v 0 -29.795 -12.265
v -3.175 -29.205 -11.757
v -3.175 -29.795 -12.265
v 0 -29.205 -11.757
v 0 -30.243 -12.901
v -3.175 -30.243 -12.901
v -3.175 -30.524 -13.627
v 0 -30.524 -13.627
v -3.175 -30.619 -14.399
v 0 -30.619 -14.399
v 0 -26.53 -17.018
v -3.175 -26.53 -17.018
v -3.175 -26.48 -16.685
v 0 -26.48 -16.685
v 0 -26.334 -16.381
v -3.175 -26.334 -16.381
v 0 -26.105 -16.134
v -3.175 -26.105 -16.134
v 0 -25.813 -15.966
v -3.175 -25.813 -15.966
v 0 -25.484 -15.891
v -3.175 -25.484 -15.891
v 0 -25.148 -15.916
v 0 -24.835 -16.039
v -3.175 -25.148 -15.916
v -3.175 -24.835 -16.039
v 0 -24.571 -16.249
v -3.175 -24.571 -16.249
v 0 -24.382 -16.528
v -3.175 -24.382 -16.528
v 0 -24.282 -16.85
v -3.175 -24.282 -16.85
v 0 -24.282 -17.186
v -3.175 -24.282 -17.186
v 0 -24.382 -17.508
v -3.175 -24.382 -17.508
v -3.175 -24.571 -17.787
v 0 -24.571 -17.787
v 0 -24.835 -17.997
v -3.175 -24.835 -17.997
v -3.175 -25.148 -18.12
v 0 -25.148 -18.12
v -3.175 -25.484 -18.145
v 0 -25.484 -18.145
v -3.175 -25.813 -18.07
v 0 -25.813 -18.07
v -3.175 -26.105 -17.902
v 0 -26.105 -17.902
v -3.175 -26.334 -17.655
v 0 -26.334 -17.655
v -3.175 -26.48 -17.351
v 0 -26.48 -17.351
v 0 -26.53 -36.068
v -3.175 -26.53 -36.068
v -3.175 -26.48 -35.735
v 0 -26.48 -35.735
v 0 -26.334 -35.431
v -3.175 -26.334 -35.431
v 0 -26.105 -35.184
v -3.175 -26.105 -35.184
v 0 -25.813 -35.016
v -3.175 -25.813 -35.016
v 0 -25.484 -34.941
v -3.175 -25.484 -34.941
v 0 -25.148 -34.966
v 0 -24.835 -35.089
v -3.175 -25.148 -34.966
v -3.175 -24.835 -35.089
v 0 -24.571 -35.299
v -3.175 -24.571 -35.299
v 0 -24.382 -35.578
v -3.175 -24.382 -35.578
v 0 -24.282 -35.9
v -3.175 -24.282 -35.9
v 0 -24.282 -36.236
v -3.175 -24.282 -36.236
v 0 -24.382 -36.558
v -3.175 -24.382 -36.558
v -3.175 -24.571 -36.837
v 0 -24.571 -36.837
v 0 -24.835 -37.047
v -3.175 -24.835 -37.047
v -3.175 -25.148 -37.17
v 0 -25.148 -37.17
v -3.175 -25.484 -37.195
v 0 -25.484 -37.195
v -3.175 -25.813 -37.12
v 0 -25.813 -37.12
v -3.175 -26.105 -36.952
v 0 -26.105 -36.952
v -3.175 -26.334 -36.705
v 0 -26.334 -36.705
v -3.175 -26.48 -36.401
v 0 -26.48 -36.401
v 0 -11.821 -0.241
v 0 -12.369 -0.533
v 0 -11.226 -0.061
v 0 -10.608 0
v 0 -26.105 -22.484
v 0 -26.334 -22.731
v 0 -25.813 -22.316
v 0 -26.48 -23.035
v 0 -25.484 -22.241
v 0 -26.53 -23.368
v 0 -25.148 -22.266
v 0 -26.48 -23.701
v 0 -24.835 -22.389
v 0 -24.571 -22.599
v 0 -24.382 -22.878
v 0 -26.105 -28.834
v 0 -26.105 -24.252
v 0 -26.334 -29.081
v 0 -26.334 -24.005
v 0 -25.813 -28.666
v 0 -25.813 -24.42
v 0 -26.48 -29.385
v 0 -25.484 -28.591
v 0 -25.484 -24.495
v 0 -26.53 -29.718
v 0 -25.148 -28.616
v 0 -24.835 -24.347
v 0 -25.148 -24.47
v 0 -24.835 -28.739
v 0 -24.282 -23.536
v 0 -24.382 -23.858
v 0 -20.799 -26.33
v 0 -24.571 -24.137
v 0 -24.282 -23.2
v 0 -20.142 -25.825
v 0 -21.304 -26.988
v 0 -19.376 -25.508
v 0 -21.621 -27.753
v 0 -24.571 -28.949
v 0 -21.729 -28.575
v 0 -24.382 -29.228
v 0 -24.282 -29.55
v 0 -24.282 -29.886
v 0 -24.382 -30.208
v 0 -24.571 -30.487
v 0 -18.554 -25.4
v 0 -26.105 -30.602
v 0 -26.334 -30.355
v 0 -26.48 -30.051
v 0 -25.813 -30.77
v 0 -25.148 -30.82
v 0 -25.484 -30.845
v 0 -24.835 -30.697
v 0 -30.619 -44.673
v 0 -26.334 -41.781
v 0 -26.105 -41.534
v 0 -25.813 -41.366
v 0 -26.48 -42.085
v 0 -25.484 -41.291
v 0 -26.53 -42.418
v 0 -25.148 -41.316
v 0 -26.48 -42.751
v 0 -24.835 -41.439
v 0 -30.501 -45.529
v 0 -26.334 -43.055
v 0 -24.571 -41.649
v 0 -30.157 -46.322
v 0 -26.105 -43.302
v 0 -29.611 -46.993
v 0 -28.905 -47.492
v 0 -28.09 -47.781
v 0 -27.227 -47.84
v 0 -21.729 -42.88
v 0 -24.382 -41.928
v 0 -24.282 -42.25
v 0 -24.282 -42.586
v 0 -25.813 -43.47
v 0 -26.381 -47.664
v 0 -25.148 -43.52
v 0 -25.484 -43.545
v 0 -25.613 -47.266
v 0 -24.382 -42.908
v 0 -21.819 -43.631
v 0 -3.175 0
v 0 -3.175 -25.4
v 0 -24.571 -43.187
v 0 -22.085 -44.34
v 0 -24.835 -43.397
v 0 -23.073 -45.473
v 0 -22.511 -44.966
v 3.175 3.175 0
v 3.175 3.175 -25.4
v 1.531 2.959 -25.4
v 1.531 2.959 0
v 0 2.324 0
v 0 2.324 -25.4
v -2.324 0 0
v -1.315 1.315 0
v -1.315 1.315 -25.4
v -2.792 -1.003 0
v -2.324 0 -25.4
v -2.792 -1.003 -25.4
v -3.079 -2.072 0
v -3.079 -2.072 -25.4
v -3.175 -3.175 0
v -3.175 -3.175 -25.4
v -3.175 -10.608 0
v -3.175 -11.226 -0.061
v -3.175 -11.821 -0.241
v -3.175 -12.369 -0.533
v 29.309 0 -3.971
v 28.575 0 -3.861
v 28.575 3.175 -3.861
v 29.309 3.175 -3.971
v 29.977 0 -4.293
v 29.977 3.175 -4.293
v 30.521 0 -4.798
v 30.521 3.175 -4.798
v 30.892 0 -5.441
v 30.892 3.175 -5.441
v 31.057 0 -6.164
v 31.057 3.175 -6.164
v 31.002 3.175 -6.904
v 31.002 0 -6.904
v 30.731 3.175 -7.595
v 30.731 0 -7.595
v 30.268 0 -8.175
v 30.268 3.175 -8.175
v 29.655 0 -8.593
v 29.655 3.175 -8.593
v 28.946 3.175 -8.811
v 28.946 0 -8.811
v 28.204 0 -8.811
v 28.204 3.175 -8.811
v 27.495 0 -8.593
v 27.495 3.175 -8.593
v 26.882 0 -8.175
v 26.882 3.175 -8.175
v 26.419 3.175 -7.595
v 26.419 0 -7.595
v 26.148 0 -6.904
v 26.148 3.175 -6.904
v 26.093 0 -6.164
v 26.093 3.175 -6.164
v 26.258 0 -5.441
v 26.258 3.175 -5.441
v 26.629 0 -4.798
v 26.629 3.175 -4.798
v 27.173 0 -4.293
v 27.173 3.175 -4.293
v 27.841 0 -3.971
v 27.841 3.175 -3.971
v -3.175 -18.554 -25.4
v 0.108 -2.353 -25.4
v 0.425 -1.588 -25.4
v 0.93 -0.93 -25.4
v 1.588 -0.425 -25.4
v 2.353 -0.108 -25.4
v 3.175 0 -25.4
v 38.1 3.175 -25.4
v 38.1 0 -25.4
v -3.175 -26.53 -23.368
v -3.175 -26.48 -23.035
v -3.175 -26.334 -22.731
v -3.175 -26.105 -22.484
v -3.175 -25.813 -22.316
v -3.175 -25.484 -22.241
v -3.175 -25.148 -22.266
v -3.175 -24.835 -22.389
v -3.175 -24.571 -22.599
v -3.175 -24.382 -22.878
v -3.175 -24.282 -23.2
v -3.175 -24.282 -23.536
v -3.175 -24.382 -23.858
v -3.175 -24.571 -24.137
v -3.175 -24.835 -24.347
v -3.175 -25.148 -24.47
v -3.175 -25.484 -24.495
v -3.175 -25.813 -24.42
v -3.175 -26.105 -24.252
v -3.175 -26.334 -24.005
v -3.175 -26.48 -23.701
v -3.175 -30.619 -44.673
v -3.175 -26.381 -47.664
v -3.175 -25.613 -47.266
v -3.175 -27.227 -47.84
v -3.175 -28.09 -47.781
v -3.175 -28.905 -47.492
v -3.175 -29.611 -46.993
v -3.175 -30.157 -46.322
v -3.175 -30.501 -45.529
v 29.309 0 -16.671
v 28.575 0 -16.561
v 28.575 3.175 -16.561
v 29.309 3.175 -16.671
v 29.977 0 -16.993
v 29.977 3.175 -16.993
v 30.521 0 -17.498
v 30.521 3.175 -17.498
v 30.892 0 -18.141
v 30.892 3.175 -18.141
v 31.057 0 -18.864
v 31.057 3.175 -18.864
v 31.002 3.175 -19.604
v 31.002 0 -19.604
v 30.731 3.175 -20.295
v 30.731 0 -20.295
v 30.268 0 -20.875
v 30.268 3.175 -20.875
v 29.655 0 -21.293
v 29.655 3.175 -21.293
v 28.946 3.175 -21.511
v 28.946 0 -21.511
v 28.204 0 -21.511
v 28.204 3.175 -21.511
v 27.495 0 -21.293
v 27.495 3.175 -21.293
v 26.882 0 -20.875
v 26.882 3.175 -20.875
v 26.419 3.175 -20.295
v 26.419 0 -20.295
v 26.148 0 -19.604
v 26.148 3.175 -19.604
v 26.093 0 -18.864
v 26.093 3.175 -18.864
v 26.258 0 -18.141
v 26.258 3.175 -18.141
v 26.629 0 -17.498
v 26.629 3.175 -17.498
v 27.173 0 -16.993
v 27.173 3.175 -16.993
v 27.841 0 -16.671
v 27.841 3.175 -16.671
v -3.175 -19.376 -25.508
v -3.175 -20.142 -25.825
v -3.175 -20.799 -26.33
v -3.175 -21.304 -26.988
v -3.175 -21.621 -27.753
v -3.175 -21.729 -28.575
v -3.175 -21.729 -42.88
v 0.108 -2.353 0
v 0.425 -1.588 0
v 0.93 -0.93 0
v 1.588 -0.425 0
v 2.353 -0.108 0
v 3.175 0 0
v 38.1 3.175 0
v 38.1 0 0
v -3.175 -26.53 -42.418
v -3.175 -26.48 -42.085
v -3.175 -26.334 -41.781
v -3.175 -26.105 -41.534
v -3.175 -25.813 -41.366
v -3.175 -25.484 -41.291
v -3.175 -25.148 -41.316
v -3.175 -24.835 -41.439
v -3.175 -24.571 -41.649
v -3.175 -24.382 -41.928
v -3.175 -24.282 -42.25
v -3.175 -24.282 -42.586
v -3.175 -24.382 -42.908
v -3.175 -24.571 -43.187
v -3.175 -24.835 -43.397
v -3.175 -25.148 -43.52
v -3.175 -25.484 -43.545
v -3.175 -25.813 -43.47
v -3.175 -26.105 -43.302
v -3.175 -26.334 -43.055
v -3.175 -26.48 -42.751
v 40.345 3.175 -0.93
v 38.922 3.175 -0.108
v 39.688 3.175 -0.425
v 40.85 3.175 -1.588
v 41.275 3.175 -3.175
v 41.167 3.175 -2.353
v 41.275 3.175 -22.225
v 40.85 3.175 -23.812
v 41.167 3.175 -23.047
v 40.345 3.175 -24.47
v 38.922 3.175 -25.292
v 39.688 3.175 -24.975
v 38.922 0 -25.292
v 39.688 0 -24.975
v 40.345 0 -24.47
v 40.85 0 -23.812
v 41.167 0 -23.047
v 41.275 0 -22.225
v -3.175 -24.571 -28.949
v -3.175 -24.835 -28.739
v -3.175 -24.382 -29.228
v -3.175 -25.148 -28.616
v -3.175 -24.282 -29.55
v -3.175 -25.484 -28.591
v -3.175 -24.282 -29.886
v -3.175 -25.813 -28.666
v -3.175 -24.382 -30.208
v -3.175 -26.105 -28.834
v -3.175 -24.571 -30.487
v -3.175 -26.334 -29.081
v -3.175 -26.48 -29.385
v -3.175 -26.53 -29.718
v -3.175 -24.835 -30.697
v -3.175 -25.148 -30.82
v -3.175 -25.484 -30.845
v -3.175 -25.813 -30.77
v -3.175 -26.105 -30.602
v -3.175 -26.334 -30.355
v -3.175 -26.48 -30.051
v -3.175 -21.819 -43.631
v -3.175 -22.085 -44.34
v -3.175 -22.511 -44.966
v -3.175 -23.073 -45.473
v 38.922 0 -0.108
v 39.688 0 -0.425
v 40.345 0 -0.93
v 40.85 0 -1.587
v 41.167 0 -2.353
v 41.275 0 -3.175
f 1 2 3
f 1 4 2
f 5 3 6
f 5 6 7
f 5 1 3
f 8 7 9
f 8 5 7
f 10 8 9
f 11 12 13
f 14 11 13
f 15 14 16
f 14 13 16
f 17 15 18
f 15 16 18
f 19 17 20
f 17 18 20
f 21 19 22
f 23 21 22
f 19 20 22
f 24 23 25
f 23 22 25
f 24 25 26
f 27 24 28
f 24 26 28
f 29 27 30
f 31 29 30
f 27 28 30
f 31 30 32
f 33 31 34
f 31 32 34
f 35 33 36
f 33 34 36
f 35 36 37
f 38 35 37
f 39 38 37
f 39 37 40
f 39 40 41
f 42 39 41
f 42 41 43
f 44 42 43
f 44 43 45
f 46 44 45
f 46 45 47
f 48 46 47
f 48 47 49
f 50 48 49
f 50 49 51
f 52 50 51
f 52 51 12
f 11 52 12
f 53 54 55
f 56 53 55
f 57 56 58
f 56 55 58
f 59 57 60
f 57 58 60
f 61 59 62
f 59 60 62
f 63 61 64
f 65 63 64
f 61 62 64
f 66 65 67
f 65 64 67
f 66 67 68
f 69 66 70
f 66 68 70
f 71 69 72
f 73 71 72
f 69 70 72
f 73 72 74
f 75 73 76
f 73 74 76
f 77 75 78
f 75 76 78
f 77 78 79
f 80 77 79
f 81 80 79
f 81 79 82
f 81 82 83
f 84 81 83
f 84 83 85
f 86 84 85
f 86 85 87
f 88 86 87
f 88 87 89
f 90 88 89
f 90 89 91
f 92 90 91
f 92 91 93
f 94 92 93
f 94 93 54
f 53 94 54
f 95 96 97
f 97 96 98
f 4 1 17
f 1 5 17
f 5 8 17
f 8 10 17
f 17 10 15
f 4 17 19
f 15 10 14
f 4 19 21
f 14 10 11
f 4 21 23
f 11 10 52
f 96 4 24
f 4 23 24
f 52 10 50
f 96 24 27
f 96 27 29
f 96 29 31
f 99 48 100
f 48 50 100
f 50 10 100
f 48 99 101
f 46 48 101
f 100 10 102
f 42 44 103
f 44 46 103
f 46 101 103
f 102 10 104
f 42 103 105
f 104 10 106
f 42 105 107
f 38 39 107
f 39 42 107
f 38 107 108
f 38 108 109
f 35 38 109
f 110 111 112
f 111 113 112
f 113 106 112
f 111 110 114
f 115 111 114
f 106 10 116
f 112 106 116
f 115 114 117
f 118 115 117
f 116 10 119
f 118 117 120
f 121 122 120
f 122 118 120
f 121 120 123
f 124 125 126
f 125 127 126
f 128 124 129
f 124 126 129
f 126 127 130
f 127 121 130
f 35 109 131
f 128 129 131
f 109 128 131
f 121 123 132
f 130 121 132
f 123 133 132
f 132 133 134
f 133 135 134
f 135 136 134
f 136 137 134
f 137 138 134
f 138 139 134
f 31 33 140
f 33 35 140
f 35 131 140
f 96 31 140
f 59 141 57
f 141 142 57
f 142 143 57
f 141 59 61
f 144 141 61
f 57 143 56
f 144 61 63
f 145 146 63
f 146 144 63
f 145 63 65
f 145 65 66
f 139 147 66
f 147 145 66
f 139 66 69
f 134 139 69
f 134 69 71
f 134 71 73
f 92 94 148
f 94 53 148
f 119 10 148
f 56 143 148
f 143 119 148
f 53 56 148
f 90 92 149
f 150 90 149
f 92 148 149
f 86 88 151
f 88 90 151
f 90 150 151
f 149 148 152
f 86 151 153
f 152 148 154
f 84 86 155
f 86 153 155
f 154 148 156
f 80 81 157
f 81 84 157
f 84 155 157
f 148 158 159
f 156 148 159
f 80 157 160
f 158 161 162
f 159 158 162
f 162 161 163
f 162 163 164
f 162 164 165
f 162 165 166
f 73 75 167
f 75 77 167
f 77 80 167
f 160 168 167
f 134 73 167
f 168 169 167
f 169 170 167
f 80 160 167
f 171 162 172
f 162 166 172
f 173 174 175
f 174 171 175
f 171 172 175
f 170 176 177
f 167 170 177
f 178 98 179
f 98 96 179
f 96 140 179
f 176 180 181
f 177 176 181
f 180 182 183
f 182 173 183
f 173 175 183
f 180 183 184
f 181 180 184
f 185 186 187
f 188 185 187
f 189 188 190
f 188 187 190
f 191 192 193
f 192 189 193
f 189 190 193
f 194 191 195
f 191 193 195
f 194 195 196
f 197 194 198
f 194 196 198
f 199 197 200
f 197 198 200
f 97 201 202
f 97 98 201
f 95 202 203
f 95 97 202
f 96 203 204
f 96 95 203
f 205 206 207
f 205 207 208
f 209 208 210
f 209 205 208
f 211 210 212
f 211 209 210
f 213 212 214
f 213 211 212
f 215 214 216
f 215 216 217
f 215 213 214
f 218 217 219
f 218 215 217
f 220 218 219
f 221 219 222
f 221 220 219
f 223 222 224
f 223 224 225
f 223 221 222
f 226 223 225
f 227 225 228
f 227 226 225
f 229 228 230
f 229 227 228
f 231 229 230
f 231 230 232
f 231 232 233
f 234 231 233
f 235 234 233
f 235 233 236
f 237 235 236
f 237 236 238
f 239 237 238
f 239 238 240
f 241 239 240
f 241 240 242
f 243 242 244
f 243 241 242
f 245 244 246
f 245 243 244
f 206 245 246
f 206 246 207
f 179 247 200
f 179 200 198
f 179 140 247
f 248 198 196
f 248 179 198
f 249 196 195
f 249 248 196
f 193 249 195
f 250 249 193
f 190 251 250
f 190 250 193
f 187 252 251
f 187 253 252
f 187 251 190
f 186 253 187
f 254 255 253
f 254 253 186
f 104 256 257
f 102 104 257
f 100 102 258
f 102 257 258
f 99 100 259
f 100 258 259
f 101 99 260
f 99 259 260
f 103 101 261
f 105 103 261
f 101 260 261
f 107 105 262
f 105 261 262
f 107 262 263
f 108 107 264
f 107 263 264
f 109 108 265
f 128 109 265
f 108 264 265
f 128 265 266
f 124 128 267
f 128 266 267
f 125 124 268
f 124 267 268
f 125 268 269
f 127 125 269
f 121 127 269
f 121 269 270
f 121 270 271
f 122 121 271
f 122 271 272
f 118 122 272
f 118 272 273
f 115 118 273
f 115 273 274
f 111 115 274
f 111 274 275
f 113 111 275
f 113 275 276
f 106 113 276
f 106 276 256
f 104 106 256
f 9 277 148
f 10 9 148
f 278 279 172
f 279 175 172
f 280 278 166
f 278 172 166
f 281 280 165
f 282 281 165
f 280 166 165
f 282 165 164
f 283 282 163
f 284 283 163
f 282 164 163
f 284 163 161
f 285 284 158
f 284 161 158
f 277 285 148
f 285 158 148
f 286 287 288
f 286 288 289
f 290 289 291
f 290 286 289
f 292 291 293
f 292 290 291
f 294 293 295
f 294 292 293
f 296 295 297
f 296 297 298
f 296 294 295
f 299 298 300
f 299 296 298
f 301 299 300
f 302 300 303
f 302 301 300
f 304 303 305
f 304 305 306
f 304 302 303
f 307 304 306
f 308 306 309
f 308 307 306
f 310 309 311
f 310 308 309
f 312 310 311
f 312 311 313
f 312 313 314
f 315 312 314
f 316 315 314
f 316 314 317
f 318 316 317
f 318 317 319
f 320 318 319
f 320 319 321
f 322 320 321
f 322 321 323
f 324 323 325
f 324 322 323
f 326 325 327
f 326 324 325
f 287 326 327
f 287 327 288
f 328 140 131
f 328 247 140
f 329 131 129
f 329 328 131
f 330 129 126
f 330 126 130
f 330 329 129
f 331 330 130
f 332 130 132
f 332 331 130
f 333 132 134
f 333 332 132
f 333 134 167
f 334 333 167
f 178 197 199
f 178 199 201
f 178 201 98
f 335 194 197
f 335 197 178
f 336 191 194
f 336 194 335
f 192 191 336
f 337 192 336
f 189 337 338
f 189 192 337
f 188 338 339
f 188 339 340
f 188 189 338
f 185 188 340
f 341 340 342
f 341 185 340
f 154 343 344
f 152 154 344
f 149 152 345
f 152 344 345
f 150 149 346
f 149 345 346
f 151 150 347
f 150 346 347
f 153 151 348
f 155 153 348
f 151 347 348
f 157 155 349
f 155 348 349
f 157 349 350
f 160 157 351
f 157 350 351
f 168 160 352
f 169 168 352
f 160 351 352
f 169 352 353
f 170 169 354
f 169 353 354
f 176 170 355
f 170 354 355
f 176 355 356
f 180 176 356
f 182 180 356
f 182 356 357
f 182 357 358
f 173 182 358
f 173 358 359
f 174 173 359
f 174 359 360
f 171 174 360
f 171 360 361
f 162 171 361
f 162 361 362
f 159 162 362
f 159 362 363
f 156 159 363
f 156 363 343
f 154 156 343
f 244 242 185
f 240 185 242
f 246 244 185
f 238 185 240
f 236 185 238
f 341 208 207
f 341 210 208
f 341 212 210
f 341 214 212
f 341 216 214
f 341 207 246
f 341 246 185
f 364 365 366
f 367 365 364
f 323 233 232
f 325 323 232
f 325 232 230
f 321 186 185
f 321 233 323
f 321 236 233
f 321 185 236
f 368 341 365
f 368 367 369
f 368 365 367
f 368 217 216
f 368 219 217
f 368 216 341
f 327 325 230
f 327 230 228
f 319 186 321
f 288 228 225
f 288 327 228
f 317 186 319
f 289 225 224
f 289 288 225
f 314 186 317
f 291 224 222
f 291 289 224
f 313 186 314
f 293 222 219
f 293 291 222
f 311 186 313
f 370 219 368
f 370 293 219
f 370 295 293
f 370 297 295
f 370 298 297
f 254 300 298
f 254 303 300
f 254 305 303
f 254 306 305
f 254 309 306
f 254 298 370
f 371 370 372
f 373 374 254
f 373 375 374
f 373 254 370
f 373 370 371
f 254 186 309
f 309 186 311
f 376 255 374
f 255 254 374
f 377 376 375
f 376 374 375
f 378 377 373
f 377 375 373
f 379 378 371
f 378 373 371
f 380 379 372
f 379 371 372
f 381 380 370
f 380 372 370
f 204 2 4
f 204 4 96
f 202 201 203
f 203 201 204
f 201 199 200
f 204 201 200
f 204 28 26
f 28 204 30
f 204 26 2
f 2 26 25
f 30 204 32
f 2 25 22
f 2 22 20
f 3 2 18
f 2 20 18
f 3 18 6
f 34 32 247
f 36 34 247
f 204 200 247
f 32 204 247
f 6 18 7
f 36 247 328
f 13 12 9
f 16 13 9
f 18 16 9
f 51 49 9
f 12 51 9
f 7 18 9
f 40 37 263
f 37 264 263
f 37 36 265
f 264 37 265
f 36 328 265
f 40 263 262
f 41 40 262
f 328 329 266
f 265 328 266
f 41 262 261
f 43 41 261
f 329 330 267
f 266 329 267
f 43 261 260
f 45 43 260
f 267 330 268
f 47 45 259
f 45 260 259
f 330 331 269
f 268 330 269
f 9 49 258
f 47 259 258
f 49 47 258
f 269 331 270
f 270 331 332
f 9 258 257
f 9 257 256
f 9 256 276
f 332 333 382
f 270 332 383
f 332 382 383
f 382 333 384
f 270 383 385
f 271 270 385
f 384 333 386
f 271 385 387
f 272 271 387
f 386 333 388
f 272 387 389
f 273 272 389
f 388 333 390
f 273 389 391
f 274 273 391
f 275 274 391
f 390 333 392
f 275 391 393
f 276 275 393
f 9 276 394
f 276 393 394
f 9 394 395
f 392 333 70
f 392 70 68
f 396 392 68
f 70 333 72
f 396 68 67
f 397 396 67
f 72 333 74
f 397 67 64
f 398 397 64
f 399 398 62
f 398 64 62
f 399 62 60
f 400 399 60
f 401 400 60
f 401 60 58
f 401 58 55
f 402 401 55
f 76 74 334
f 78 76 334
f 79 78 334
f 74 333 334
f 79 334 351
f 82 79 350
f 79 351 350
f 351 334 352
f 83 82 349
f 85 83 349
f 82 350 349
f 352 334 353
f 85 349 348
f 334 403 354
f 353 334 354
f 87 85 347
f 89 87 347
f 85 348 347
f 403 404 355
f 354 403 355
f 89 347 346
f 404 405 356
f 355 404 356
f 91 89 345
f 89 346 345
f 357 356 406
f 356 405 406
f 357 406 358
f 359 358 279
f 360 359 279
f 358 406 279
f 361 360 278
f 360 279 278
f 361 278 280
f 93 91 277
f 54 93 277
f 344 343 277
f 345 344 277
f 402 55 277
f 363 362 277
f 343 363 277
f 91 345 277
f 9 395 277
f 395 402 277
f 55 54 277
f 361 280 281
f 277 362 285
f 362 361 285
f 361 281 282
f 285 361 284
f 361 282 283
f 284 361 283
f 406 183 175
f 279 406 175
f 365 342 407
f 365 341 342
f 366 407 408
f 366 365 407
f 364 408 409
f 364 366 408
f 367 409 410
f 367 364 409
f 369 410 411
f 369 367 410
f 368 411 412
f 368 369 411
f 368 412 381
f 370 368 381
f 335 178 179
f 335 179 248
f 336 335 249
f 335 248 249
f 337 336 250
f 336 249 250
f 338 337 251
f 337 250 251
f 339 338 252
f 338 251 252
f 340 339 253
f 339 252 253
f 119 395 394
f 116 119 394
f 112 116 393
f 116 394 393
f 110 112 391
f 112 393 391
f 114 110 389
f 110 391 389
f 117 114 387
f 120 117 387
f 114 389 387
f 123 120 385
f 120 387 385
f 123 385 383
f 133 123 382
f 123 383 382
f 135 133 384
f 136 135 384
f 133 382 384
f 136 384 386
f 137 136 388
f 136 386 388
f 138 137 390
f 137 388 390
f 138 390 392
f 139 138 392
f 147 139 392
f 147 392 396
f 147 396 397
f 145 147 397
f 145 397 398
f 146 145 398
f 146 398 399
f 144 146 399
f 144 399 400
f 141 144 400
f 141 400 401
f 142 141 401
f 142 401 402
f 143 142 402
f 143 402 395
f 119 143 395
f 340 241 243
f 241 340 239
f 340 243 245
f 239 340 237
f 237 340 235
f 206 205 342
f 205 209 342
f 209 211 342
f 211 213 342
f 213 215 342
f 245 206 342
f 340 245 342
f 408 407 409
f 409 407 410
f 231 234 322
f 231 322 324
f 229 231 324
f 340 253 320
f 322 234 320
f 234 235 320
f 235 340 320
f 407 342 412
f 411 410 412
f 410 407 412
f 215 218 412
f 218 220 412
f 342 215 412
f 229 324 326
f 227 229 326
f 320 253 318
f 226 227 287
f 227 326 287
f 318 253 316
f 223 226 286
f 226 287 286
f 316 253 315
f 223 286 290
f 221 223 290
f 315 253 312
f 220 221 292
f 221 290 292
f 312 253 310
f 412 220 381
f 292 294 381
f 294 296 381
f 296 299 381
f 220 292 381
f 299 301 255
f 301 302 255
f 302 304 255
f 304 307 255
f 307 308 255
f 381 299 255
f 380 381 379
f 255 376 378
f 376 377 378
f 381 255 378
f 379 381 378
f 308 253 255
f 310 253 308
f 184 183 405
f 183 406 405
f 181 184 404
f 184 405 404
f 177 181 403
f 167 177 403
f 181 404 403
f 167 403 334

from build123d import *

# Parameters (mm, degrees)
SKETCH1_R                  = 2.4892
BOSS_EXTRUDE1_DEPTH        = 3.175
SKETCHED_START             = -52
SKETCHED_BEND2_DEPTH       = 52
SKETCHED_START_2           = -25.4
SKETCHED_BEND2_2_DEPTH     = 12.7
SKETCHED_START_3           = -41.835294118
SKETCHED_BEND2_3_OUTLINE_W = 3.175
SKETCHED_BEND2_3_OUTLINE_H = 12.7
SKETCHED_BEND2_3_DEPTH     = 16.435294118
SKETCHED_BEND2_4_DEPTH     = 20.459192
SKETCHED_START_4           = -50.8
SKETCHED_BEND2_5_OUTLINE_W = 3.175
SKETCHED_BEND2_5_OUTLINE_H = 12.7
SKETCHED_BEND2_5_DEPTH     = 48.117252
SKETCHED_START_5           = -4.940808
SKETCHED_BEND2_6_DEPTH     = 4.940808
SKETCHED_START_6           = -3.175
SKETCHED_BEND2_7_DEPTH     = 3.175
SKETCH13_R                 = 1.1303
CUT_EXTRUDE2_DEPTH         = 75.121324278
FILLET1_R                  = 3.175
SKETCH14_W                 = 20.670157998
SKETCH14_H                 = 6.985
CUT_EXTRUDE3_DEPTH         = 71.21778451
FILLET2_R                  = 3.175


with BuildPart() as part:
    # Sketch1 → Boss-Extrude1 (new body)
    # profile 1 of 2: a face of its own
    with BuildSketch(Plane(origin=(0, 0, 0), x_dir=(1, 0, 0), z_dir=(0, 1, 0))):
        Polygon((6.35, 0), (25.4, 0), (28.575, 0), (41.275, 0), (41.275, 25.4), (27.523477182, 25.4), (14.823477182, 25.4), (6.35, 25.4), align=None)
        with Locations(Location((28.575, 6.35, 0), (0, 0, 270))):
            Circle(SKETCH1_R, mode=Mode.SUBTRACT)
        with Locations(Location((28.575, 19.05, 0), (0, 0, 270))):
            Circle(SKETCH1_R, mode=Mode.SUBTRACT)
    # profile 2 of 2: a face of its own
    with BuildSketch(Plane(origin=(0, 0, 0), x_dir=(1, 0, 0), z_dir=(0, 1, 0))):
        Polygon((-12.7, 0), (6.35, 0), (6.35, 25.4), (0, 25.4), (-19.05, 25.4), (-19.05, 41.835294118), (-23.415467049, 44.91680027), (-31.75, 50.8), (-31.75, 12.7), (-23.415467049, 7.143644699), align=None)
    extrude(amount=BOSS_EXTRUDE1_DEPTH)

    # Sketched Bend2: read off the stored shape, not the designer's step
    # Sketched Bend2 outline → Sketched Bend2 (cut)
    with BuildSketch(Plane.XY.offset(SKETCHED_START)):
        with BuildLine():
            ThreePointArc((-2.324261315, 0), (-1e-09, 2.324261314), (3.175, 3.175))
            Line((3.175, 3.175), (-31.75, 3.175))
            Line((-31.75, 3.175), (-31.75, 0))
            Line((-31.75, 0), (-2.324261315, 0))
        make_face()
    extrude(amount=SKETCHED_BEND2_DEPTH, mode=Mode.SUBTRACT)

    # Sketched Bend2 2 outline → Sketched Bend2 2 (add)
    with BuildSketch(Plane.XY.offset(SKETCHED_START_2)):
        with BuildLine():
            ThreePointArc((-2.324261315, 0), (-2.958628997, -1.531499064), (-3.175, -3.175))
            Line((-3.175, -3.175), (-3.175, -30.619082494))
            Line((-3.175, -30.619082494), (0, -30.619082494))
            Line((0, -30.619082494), (0, -3.175))
            ThreePointArc((0, -3.175), (0.92993597, -0.92993597), (3.175, 0))
            Line((3.175, 0), (-2.324261315, 0))
        make_face()
    extrude(amount=SKETCHED_BEND2_2_DEPTH)

    # Sketched Bend2 3 outline → Sketched Bend2 3 (add)
    with BuildSketch(Plane.XY.offset(SKETCHED_START_3)):
        with Locations((-1.5875, -24.269082494)):
            Rectangle(SKETCHED_BEND2_3_OUTLINE_W, SKETCHED_BEND2_3_OUTLINE_H)
    extrude(amount=SKETCHED_BEND2_3_DEPTH)

    # Sketched Bend2 4 outline → Sketched Bend2 4 (add)
    with BuildSketch(Plane.XY.offset(SKETCHED_START_2)):
        with BuildLine():
            ThreePointArc((-2.324261315, 0), (-2.958628997, -1.531499064), (-3.175, -3.175))
            Line((-3.175, -3.175), (-3.175, -17.919082494))
            Line((-3.175, -17.919082494), (0, -17.919082494))
            Line((0, -17.919082494), (0, -3.175))
            ThreePointArc((0, -3.175), (0.92993597, -0.92993597), (3.175, 0))
            Line((3.175, 0), (-2.324261315, 0))
        make_face()
    extrude(amount=SKETCHED_BEND2_4_DEPTH)

    # Sketched Bend2 5 outline → Sketched Bend2 5 (add)
    with BuildSketch(Plane.XY.offset(SKETCHED_START_4)):
        with Locations((-1.5875, -24.269082494)):
            Rectangle(SKETCHED_BEND2_5_OUTLINE_W, SKETCHED_BEND2_5_OUTLINE_H)
    extrude(amount=SKETCHED_BEND2_5_DEPTH)

    # Sketched Bend2 6 outline → Sketched Bend2 6 (add)
    with BuildSketch(Plane.XY.offset(SKETCHED_START_5)):
        with BuildLine():
            ThreePointArc((-2.324261315, 0), (-2.958628997, -1.531499064), (-3.175, -3.175))
            Line((-3.175, -3.175), (-3.175, -17.919082494))
            Line((-3.175, -17.919082494), (0, -17.919082494))
            Line((0, -17.919082494), (0, -3.175))
            ThreePointArc((0, -3.175), (0.92993597, -0.92993597), (3.175, 0))
            Line((3.175, 0), (-2.324261315, 0))
        make_face()
    extrude(amount=SKETCHED_BEND2_6_DEPTH)

    # Sketched Bend2 7 outline → Sketched Bend2 7 (cut)
    with BuildSketch(Plane.YZ.offset(SKETCHED_START_6)):
        Polygon((-30.619082494, -2.682748), (-30.619082494, -12.7), (-11.569082494, 0), (-17.919082494, 0), (-17.919082494, -2.682748), align=None)
        Polygon((-17.919082494, -41.835294118), (-30.619082494, -50.8), (-17.919082494, -50.8), align=None)
    extrude(amount=SKETCHED_BEND2_7_DEPTH, mode=Mode.SUBTRACT)

    # Sketch13 → Cut-Extrude2 (cut, through all)
    with BuildSketch(Plane.ZY.offset(3.175)):
        with Locations(Location((-17.018, -25.4, 0), (0, 0, 270))):
            Circle(SKETCH13_R)
        with Locations(Location((-23.368, -25.4, 0), (0, 0, 270))):
            Circle(SKETCH13_R)
        with Locations(Location((-29.718, -25.4, 0), (0, 0, 270))):
            Circle(SKETCH13_R)
        with Locations(Location((-36.068, -25.4, 0), (0, 0, 270))):
            Circle(SKETCH13_R)
        with Locations(Location((-42.418, -25.4, 0), (0, 0, 270))):
            Circle(SKETCH13_R)
    extrude(amount=-CUT_EXTRUDE2_DEPTH, mode=Mode.SUBTRACT)

    # Fillet1
    fillet1_edges = [part.edges().sort_by_distance(p)[0] for p in [
        (-1.5875, -17.919082494, -41.835294118),
        (-1.5875, -17.919082494, -25.4),
        (-1.5875, -11.569082494, 0),
        (-1.5875, -30.619082494, -12.7),
        (-1.5875, -30.619082494, -50.8),
        (41.275, 1.5875, -25.4),
        (41.275, 1.5875, 0),
    ]]
    fillet(fillet1_edges, radius=FILLET1_R)

    # Sketch14 → Cut-Extrude3 (cut, through all)
    with BuildSketch(Plane(origin=(0, 0, 0), x_dir=(0, 0, -1), z_dir=(1, 0, 0))):
        with Locations((35.735078999, -18.236582494)):
            Rectangle(SKETCH14_W, SKETCH14_H)
    extrude(amount=-CUT_EXTRUDE3_DEPTH, mode=Mode.SUBTRACT)

    # Fillet2
    fillet2_edges = [part.edges().sort_by_distance(p)[0] for p in [
        (-1.5875, -21.729082494, -44.524705882),
        (-1.5875, -21.729082494, -25.4),
    ]]
    fillet(fillet2_edges, radius=FILLET2_R)


solid = part.part
